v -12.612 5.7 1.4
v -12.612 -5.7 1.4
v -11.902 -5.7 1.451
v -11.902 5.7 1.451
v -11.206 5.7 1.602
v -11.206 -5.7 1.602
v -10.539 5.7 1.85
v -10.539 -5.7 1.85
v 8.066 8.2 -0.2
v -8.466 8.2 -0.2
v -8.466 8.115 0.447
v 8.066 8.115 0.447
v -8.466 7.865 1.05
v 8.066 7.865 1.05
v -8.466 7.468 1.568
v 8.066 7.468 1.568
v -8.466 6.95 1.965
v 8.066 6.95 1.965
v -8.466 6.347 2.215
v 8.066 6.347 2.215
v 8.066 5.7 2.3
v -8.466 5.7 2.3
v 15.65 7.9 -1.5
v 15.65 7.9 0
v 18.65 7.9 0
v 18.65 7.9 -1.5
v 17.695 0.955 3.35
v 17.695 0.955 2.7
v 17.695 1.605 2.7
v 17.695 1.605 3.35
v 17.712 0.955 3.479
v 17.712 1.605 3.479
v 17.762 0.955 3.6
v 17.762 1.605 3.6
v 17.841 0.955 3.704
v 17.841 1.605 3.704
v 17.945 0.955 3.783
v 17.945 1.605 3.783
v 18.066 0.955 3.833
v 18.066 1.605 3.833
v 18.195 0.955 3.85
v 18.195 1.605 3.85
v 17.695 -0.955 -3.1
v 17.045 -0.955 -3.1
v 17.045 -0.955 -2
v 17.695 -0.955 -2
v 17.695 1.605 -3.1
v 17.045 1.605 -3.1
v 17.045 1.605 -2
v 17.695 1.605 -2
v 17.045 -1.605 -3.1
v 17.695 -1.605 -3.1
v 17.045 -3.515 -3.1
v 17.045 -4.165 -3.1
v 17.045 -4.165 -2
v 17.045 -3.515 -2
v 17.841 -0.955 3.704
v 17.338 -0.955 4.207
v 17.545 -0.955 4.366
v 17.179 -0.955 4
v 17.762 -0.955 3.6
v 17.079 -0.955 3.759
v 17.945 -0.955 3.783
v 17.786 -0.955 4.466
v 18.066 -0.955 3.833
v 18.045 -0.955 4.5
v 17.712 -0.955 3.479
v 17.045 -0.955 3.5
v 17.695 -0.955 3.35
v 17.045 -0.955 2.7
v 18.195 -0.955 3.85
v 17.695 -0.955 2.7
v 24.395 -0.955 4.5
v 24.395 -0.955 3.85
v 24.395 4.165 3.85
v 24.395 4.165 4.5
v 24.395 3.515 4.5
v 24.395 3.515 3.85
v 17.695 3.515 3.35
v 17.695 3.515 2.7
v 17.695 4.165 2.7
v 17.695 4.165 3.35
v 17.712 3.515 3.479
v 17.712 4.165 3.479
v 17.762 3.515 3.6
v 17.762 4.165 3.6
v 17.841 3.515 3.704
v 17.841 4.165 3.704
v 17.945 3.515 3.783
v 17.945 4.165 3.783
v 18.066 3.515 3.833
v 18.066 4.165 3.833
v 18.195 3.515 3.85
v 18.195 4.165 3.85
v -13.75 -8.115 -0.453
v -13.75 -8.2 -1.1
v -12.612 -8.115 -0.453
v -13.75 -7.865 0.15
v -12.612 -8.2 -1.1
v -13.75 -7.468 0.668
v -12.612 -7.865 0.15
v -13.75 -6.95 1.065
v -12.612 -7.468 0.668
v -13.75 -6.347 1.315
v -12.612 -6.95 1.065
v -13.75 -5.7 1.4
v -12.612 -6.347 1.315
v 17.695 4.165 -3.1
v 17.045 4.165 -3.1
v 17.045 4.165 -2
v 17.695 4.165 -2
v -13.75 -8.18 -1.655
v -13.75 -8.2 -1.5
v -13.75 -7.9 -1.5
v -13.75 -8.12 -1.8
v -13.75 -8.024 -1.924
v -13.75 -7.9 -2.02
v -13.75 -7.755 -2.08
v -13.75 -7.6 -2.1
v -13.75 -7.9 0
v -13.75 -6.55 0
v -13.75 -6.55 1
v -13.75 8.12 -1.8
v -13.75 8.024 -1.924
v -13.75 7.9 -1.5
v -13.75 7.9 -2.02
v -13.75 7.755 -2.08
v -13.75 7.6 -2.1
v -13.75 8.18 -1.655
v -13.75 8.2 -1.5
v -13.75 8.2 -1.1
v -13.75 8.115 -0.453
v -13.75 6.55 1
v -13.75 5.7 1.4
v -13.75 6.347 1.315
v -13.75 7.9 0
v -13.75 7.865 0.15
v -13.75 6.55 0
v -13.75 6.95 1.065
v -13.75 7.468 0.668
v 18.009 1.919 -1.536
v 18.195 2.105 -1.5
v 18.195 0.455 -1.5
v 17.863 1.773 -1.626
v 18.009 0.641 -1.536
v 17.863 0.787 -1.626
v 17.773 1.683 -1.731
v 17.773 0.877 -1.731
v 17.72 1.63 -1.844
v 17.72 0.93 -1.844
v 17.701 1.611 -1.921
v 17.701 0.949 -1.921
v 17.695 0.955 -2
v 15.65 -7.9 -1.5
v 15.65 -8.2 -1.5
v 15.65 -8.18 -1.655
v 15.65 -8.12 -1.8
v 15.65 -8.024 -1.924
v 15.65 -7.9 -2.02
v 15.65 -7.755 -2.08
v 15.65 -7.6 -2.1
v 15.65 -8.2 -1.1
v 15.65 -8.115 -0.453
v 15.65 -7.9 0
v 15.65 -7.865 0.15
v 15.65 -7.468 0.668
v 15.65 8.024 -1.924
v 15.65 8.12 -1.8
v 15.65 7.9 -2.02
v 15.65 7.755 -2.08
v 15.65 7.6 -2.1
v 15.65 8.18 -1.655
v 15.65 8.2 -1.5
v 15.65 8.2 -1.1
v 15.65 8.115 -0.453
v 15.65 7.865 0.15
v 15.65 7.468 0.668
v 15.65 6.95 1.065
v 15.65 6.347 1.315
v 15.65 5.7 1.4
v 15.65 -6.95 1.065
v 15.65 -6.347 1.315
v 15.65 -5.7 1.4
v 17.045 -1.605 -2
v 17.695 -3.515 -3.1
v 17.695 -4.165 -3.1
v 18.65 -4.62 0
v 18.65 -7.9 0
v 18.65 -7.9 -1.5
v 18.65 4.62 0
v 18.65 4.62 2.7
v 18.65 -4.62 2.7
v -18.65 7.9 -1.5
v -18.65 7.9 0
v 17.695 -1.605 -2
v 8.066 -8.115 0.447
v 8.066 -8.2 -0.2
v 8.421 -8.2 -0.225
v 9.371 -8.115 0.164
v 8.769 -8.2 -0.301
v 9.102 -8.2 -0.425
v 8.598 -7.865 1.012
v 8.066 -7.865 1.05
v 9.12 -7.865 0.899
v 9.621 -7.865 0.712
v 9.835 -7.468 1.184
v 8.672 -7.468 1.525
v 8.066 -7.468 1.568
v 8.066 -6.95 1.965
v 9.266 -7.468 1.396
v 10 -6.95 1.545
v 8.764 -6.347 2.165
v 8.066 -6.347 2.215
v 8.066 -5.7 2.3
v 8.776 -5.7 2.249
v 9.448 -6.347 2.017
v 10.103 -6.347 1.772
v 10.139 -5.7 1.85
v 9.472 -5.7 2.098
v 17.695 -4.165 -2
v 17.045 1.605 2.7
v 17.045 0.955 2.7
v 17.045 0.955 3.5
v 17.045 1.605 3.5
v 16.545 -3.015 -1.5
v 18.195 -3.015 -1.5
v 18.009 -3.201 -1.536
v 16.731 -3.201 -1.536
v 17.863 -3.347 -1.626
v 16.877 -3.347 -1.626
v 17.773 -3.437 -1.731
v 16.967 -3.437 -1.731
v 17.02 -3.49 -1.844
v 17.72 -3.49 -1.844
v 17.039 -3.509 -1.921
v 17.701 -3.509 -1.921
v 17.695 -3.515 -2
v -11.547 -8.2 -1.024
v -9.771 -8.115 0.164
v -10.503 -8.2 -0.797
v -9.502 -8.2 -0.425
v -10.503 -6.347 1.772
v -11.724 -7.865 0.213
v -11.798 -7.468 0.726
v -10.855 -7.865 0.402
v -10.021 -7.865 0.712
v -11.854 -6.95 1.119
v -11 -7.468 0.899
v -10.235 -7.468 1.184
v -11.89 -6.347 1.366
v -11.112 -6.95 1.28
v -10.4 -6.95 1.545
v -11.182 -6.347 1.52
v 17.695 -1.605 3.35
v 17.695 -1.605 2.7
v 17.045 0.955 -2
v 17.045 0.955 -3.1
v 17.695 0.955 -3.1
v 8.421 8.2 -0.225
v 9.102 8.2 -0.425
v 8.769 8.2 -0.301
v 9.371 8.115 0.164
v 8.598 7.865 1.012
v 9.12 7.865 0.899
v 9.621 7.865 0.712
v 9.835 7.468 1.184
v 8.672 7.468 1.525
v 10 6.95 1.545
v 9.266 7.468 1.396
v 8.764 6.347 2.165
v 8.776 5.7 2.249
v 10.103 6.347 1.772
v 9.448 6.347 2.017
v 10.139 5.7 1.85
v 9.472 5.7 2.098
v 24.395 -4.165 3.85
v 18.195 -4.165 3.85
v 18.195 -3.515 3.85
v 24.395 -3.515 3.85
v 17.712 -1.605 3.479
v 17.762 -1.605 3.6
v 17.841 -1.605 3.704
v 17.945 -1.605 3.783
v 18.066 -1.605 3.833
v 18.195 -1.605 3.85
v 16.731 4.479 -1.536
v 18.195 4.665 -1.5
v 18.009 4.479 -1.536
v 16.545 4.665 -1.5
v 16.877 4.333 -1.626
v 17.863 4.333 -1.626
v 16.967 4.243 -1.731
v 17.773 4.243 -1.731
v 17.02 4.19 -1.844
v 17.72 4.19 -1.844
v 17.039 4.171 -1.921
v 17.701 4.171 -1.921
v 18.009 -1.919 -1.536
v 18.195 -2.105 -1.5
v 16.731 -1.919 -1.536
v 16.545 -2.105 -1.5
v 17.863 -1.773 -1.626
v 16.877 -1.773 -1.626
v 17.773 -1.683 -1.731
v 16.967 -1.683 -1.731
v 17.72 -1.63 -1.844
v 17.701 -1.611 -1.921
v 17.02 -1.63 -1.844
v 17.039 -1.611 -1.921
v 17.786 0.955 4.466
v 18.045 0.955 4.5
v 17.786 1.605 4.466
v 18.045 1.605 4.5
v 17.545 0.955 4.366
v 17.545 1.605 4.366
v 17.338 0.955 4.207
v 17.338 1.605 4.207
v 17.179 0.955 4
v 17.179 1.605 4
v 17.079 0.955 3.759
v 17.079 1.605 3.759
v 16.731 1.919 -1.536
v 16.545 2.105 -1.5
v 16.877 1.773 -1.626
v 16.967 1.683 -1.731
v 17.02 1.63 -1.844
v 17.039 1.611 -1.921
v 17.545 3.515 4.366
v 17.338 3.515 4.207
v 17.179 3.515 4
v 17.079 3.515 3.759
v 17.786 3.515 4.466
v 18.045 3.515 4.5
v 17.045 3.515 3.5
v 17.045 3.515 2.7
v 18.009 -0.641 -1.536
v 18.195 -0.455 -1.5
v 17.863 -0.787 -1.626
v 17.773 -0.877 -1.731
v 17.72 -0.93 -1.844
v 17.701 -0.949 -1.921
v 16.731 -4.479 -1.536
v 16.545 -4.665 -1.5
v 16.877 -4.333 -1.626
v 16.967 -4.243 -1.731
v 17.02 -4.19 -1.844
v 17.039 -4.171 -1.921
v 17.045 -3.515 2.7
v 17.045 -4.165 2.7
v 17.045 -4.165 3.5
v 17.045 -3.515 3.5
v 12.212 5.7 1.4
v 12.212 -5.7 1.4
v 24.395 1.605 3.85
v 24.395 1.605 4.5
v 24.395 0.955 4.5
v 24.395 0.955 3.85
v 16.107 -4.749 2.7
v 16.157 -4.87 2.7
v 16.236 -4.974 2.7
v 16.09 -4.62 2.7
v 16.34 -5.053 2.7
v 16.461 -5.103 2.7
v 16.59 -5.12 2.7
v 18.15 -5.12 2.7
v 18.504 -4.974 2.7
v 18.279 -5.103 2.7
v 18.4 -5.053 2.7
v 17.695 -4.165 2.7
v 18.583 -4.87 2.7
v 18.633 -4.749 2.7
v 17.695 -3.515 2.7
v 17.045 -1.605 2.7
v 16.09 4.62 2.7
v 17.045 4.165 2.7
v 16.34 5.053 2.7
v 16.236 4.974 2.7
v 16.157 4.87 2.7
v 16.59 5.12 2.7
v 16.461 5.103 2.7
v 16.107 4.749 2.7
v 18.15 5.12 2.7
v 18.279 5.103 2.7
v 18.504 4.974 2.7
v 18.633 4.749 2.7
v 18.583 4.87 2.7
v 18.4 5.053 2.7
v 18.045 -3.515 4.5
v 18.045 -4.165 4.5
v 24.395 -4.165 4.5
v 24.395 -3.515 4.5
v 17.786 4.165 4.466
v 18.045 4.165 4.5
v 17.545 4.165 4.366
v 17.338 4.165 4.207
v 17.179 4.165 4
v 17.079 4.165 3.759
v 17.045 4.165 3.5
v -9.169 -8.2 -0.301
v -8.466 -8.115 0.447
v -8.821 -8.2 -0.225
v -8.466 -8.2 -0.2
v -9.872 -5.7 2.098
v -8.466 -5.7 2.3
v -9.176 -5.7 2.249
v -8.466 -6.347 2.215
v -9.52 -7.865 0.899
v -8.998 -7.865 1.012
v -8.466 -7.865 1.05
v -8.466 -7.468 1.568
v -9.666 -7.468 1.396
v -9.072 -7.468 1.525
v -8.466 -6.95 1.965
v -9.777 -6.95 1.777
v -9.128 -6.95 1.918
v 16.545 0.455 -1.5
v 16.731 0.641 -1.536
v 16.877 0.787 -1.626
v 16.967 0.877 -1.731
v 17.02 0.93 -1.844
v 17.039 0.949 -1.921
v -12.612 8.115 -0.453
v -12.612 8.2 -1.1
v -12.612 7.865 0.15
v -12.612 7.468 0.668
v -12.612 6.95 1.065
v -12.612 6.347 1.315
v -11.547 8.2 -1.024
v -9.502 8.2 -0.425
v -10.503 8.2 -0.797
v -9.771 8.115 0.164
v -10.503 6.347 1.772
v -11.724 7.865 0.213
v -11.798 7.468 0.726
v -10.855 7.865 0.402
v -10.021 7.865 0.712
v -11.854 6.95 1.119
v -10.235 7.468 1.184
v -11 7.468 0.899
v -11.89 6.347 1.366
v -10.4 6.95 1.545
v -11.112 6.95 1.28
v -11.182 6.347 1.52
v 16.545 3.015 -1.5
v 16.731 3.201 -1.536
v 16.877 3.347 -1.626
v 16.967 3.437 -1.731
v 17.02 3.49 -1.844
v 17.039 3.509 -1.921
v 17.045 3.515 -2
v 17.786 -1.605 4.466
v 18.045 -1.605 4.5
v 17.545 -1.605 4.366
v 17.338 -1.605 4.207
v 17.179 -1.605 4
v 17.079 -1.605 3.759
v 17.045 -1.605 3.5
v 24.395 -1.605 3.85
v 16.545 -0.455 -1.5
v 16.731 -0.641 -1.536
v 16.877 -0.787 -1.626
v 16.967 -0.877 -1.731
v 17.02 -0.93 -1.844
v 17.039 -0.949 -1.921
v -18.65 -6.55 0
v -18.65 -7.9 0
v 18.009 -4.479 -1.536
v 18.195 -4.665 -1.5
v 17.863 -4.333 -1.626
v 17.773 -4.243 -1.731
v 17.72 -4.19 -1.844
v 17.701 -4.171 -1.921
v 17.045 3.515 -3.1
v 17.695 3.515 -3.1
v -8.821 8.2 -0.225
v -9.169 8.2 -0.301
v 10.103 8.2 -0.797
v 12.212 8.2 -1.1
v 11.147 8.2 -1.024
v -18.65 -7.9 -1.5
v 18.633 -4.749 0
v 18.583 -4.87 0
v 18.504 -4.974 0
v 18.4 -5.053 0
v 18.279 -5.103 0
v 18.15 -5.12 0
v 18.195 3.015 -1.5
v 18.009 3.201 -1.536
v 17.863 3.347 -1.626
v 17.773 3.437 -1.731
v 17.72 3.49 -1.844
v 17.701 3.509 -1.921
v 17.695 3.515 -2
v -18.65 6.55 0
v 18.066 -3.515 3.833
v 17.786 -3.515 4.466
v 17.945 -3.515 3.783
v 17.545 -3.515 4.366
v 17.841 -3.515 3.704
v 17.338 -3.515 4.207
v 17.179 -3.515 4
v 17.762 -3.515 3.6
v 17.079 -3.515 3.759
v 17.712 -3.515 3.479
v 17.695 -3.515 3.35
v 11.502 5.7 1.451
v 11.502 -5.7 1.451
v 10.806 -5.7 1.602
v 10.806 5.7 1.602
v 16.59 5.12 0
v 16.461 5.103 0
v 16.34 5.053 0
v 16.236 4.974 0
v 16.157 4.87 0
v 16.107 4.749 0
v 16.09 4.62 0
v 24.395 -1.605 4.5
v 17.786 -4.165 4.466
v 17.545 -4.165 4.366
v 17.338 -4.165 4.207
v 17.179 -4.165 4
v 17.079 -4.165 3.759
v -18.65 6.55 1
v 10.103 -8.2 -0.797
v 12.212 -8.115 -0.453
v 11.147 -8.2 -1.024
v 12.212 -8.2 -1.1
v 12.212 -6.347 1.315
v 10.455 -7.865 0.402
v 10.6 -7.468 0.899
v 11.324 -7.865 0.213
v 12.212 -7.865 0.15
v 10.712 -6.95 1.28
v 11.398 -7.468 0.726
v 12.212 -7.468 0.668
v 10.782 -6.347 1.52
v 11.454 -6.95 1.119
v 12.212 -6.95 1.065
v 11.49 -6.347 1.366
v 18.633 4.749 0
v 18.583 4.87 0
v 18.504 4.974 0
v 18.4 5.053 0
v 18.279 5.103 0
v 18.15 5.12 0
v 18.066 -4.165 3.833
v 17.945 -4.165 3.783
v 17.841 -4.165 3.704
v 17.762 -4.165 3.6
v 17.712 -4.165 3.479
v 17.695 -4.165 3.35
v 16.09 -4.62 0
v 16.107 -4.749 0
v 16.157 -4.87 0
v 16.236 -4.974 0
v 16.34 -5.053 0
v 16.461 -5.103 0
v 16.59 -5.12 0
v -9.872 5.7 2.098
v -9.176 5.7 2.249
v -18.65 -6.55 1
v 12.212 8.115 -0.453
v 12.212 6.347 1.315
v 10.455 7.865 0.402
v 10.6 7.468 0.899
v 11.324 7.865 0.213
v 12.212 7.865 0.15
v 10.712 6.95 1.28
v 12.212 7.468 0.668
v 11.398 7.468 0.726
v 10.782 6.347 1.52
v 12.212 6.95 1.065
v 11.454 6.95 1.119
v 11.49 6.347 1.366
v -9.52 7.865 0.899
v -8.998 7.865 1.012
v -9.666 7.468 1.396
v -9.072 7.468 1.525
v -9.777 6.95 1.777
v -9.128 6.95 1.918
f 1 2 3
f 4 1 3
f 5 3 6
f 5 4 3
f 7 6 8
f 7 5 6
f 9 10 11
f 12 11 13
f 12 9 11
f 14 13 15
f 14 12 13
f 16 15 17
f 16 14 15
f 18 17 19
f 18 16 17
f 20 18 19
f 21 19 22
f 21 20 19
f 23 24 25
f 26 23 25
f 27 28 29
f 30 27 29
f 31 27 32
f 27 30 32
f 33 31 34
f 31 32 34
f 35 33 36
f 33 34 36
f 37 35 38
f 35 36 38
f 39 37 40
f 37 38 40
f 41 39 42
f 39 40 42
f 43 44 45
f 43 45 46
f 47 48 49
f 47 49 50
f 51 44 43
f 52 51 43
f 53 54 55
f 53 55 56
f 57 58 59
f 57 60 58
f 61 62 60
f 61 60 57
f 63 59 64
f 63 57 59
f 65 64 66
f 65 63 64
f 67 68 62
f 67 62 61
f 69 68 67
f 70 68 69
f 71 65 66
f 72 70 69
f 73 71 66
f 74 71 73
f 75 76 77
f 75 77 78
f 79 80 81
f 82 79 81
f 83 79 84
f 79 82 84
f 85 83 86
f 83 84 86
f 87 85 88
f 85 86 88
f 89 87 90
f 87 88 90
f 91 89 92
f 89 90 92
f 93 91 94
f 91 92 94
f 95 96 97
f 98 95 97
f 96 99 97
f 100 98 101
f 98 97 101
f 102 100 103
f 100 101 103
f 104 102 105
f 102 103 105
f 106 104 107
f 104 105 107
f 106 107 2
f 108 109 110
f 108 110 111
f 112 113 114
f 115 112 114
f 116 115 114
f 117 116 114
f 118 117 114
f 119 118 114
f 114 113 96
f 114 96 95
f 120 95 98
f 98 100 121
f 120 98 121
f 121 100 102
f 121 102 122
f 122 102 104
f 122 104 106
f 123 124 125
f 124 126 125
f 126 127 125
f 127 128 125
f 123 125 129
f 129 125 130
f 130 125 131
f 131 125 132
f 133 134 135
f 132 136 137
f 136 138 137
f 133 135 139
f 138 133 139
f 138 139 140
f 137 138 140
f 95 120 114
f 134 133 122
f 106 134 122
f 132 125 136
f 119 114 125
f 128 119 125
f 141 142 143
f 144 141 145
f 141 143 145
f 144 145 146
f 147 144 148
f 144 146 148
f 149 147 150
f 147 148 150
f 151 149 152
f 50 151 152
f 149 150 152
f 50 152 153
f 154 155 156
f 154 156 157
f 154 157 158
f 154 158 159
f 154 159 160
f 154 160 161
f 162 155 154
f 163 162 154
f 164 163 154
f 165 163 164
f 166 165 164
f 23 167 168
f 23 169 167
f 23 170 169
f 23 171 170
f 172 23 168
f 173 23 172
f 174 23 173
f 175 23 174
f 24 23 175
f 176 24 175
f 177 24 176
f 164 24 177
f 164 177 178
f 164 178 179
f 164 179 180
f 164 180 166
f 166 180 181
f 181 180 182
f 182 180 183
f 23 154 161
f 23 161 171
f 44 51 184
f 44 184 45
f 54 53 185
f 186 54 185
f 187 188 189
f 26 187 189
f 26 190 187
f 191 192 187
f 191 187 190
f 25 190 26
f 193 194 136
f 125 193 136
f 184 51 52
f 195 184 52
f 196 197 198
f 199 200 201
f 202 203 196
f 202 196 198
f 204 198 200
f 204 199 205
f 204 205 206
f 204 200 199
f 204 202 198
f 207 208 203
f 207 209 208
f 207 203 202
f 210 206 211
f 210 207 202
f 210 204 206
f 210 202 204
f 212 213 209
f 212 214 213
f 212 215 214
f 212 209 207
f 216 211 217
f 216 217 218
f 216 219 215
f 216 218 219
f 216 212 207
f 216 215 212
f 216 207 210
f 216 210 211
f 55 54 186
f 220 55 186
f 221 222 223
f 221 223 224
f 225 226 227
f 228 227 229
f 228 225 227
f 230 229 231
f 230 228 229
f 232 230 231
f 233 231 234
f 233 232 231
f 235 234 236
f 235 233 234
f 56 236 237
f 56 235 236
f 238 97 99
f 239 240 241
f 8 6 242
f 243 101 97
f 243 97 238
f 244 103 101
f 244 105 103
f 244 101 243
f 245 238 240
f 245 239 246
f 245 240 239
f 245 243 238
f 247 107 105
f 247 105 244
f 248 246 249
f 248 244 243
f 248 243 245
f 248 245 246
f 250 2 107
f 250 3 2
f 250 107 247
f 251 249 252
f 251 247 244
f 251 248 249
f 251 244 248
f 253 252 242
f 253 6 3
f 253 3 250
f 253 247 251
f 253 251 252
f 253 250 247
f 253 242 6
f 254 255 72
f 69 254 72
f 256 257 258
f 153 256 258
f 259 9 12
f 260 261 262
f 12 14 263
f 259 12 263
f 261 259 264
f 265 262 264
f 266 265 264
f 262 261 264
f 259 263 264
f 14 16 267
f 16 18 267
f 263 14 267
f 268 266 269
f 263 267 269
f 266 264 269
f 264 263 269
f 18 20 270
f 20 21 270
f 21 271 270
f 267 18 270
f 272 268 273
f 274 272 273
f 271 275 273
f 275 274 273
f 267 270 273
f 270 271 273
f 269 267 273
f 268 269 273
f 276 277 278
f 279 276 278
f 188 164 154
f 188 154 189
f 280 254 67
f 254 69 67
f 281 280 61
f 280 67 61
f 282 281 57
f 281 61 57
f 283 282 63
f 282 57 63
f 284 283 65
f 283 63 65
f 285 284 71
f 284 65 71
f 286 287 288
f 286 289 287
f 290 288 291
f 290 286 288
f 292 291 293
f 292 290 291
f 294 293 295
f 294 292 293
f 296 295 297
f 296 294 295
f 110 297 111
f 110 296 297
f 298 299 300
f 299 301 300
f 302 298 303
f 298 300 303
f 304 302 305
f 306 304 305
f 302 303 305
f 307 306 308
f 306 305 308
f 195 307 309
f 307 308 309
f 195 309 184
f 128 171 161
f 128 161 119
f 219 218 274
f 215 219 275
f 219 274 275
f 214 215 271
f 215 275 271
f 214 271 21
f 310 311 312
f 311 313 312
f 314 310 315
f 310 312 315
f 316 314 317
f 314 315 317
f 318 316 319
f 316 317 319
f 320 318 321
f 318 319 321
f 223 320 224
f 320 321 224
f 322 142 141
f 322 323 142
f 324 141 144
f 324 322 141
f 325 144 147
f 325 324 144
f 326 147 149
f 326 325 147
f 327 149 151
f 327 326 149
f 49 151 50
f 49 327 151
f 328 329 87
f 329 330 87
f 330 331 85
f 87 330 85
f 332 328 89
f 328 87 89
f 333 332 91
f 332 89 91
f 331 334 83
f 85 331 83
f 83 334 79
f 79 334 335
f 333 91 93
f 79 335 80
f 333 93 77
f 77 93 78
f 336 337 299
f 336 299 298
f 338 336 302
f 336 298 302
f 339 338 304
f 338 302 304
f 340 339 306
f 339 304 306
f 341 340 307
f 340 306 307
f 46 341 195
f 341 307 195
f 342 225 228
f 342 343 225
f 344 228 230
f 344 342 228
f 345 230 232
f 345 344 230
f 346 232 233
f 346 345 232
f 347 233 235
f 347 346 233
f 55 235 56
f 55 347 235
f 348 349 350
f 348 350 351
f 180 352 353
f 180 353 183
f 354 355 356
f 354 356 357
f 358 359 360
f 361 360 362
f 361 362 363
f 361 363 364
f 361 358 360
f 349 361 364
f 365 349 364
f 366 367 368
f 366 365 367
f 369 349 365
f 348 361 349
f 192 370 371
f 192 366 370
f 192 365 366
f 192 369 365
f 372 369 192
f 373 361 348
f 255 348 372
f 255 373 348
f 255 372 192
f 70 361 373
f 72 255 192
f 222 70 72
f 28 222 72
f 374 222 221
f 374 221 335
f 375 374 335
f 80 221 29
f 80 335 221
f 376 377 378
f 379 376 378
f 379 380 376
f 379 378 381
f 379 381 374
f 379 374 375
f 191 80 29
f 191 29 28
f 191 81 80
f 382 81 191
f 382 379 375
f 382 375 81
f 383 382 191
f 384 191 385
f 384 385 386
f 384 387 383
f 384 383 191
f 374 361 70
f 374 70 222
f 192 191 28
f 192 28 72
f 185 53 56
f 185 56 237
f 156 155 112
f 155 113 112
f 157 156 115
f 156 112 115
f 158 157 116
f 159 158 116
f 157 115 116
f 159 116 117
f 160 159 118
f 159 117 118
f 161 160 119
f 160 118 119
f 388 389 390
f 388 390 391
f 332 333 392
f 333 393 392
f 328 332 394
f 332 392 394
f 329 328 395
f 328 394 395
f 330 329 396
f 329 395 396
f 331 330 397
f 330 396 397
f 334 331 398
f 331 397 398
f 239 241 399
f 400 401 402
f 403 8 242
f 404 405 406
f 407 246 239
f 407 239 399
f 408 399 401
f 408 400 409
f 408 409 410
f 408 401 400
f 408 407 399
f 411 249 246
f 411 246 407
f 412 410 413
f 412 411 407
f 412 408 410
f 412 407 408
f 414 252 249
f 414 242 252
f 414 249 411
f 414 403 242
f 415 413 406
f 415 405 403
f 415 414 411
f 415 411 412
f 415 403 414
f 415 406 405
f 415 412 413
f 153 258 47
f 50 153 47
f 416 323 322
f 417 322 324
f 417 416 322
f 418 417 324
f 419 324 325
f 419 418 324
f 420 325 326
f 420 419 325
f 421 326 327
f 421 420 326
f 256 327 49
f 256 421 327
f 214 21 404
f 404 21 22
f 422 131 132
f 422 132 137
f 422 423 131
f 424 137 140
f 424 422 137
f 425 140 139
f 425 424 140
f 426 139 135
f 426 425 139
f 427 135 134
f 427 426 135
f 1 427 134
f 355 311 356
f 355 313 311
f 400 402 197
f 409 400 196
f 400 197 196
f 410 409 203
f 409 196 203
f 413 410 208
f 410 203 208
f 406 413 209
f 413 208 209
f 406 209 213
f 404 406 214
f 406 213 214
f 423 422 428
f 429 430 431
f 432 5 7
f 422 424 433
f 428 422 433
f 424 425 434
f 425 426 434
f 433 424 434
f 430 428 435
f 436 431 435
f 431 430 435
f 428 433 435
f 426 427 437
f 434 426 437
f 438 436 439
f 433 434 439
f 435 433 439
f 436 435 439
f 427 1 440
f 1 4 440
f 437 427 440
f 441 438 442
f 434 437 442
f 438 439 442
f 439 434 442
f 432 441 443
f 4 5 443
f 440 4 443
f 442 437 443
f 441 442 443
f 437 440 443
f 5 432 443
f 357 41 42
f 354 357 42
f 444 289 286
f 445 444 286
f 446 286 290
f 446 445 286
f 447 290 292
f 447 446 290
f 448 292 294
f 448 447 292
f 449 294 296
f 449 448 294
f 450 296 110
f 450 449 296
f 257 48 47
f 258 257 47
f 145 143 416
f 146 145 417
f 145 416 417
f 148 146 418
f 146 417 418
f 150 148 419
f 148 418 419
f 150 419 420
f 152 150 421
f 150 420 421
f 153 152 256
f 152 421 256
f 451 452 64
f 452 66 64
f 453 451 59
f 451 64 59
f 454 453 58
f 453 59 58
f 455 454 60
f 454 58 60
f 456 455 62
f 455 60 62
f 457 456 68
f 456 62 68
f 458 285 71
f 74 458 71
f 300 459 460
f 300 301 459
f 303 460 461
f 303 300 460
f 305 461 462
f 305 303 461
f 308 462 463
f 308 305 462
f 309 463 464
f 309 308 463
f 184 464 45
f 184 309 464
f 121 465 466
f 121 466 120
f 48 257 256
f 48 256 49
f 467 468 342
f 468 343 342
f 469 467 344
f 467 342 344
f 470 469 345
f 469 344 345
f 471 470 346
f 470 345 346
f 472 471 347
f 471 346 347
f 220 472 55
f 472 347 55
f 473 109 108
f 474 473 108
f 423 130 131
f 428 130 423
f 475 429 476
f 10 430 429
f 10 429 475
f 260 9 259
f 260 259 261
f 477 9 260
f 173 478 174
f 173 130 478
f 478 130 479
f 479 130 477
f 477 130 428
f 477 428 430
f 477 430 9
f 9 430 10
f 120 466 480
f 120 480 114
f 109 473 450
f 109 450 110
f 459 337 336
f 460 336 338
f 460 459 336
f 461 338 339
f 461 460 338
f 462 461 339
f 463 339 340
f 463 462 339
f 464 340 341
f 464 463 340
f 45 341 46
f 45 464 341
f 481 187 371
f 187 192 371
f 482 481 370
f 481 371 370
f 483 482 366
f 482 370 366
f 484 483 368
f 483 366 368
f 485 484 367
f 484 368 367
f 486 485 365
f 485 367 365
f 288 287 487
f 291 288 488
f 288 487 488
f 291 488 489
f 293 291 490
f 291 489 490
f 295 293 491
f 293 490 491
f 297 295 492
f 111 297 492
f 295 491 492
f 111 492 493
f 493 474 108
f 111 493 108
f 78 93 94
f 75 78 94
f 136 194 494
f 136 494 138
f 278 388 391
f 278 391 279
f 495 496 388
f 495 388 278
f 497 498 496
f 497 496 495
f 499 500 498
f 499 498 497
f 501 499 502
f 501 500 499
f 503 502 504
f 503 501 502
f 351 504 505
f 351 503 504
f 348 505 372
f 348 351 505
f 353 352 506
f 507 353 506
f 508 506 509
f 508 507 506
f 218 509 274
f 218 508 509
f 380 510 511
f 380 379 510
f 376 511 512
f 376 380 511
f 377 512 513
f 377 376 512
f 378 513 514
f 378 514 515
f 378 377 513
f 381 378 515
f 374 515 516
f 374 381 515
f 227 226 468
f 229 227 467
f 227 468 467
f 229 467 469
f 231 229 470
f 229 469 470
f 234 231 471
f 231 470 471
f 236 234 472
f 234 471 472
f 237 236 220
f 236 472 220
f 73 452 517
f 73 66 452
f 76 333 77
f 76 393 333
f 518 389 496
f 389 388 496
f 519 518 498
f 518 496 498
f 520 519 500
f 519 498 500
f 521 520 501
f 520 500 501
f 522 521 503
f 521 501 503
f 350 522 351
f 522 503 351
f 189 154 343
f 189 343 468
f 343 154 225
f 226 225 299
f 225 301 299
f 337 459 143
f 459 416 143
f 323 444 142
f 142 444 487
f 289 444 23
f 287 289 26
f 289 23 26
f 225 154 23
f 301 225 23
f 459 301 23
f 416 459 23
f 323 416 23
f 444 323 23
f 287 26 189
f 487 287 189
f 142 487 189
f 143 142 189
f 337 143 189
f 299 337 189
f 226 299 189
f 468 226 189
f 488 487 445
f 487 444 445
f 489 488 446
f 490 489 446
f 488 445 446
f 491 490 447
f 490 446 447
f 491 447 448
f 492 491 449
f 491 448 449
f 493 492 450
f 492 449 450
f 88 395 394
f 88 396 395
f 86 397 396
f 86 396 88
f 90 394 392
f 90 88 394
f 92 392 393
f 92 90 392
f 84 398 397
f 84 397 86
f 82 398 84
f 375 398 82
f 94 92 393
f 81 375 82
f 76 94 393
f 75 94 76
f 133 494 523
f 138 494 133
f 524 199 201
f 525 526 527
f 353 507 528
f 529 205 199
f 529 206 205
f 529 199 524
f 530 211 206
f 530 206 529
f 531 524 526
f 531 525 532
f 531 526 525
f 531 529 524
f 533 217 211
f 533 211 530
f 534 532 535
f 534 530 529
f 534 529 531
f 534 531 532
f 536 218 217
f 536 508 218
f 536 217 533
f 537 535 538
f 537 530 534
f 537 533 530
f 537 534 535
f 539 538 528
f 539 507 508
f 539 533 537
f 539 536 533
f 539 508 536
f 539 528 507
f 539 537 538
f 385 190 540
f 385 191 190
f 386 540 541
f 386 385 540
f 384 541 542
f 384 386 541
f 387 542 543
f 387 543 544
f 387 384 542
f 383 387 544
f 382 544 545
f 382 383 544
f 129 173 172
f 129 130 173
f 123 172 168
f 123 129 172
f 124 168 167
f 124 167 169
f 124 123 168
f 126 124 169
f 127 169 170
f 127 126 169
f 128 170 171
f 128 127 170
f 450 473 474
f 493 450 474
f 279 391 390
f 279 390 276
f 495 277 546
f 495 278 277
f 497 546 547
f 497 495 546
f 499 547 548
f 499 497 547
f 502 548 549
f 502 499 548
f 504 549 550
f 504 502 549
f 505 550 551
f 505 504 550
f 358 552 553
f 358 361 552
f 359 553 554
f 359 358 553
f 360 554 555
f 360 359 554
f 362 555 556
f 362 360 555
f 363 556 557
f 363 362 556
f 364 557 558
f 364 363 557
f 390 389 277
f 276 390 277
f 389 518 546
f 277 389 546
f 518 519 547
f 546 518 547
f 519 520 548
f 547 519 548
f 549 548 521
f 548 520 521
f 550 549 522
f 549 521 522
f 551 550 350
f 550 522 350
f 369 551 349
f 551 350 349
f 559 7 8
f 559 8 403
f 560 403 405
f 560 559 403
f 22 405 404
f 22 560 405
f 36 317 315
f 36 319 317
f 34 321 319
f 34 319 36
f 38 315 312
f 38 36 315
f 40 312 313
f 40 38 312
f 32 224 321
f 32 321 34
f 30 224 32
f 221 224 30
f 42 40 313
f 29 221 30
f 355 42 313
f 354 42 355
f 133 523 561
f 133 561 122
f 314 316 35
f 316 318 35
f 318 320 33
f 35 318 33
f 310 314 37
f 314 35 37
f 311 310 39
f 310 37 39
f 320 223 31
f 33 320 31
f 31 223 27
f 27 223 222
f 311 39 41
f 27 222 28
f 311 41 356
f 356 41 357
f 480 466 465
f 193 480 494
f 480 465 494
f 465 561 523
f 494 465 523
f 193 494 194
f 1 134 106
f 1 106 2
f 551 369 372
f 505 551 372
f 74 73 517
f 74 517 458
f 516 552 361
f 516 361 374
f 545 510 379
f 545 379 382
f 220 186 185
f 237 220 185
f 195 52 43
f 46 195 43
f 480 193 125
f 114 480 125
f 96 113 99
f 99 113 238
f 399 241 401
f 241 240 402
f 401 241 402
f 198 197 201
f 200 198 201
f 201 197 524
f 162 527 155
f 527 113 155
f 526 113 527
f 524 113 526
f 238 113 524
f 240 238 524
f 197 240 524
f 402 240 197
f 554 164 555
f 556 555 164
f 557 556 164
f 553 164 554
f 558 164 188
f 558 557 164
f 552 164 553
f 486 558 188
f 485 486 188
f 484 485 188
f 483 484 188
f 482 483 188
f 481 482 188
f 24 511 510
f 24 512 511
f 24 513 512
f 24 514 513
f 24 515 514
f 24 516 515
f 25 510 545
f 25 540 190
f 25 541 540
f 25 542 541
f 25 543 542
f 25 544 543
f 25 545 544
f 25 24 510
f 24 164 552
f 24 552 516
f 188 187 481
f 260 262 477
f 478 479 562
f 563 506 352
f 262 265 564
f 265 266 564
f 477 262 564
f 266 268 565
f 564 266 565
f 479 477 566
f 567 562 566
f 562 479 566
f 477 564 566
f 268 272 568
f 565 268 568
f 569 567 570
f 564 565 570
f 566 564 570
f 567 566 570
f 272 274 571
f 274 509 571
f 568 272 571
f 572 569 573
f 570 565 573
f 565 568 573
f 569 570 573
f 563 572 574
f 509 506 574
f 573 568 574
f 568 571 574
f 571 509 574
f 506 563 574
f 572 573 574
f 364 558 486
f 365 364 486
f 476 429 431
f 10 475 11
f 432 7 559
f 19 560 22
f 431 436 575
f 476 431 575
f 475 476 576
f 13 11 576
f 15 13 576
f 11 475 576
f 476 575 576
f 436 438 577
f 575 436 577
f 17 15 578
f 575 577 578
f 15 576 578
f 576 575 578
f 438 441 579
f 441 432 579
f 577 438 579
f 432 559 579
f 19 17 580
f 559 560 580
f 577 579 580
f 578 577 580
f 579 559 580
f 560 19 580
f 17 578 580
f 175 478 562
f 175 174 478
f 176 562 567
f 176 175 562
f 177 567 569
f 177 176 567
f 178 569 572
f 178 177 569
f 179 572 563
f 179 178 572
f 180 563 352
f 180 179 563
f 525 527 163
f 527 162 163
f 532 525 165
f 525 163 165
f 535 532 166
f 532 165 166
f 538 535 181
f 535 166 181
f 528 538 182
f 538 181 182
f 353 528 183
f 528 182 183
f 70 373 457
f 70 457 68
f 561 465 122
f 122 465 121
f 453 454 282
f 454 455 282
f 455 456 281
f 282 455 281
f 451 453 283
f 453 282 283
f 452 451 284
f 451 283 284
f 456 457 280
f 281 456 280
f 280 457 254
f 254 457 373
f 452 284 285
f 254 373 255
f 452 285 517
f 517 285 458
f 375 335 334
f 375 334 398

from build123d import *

# Parameters (mm, degrees)
SKICA1_W                     = 37.3
SKICA1_H                     = 15.8
P_IDAT_VYSUNUT_M1_DEPTH      = 1.5
SKICA1_3_W                   = 27.2
SKICA1_3_H                   = 13.1
P_IDAT_VYSUNUT_M2_DEPTH      = 1
SKICA2_W                     = 2.56
SKICA2_H                     = 10.24
P_IDAT_VYSUNUT_M3_DEPTH      = 2.7
P_IDAT_VYSUNUT_M4_DEPTH      = 1.8
P_IDAT_VYSUNUT_M4_DEPTH_BACK = 5.8
SKICA3_W                     = 0.65
SKICA3_H                     = 0.65
SKICA4_W                     = 0.65
SKICA4_H                     = 0.65
P_IDAT_VYSUNUT_M5_DEPTH      = 6.7
ZAOBLIT1_R                   = 1
ZAOBLIT2_R                   = 0.5
P_IDAT_VYSUNUT_M6_DEPTH      = 0.6
P_IDAT_VYSUNUT_M6_DEPTH_BACK = 3.8
SKICA5_W                     = 29.4
SKICA5_H                     = 16.4
SKICA6_W                     = 6.3
SKICA6_H                     = 16.4
ODEBRAT_VYSUNUT_M1_DEPTH     = 0.9
ZAOBLIT3_R                   = 5
ZAOBLIT4_R                   = 5
SKICA7_W                     = 4
SKICA7_H                     = 16.4
ODEBRAT_VYSUNUT_M2_DEPTH     = 0.9
ZAOBLIT7_R                   = 5
ZAOBLIT8_R                   = 5
ZAOBLIT5_R                   = 2.5
ZAOBLIT6_R                   = 0.6
ZAOBLIT9_R                   = 0.5
ZAOBLIT10_R                  = 0.5


with BuildPart() as part:
    # Skica1 → Přidat vysunutím1 (new body)
    with BuildSketch(Plane.XY):
        Rectangle(SKICA1_W, SKICA1_H)
    extrude(amount=-P_IDAT_VYSUNUT_M1_DEPTH)

    # Skica1<3> → Přidat vysunutím2 (add)
    with BuildSketch(Plane.XY):
        with Locations((-5.05, 0)):
            Rectangle(SKICA1_3_W, SKICA1_3_H)
    extrude(amount=P_IDAT_VYSUNUT_M2_DEPTH)

    # Skica2 → Přidat vysunutím3 (add)
    with BuildSketch(Plane.XY):
        with Locations((17.37, 0)):
            Rectangle(SKICA2_W, SKICA2_H)
    extrude(amount=P_IDAT_VYSUNUT_M3_DEPTH)

    # Skica3 → Přidat vysunutím4 (add, two sides: drawn at the far end of the back side and taken through both)
    with BuildSketch(Plane.XY.offset(2.7).offset(-P_IDAT_VYSUNUT_M4_DEPTH_BACK)):
        with Locations((17.37, -3.84)):
            Rectangle(SKICA3_W, SKICA3_H)
        with Locations((17.37, -1.28)):
            Rectangle(SKICA3_W, SKICA3_H)
        with Locations((17.37, 1.28)):
            Rectangle(SKICA3_W, SKICA3_H)
        with Locations((17.37, 3.84)):
            Rectangle(SKICA3_W, SKICA3_H)
    extrude(amount=P_IDAT_VYSUNUT_M4_DEPTH + P_IDAT_VYSUNUT_M4_DEPTH_BACK)

    # Skica4 → Přidat vysunutím5 (add)
    with BuildSketch(Plane(origin=(17.695, 0, 0), x_dir=(0, 0, -1), z_dir=(1, 0, 0))):
        with Locations((-4.175, -3.84)):
            Rectangle(SKICA4_W, SKICA4_H)
        with Locations((-4.175, -1.28)):
            Rectangle(SKICA4_W, SKICA4_H)
        with Locations((-4.175, 1.28)):
            Rectangle(SKICA4_W, SKICA4_H)
        with Locations((-4.175, 3.84)):
            Rectangle(SKICA4_W, SKICA4_H)
    extrude(amount=P_IDAT_VYSUNUT_M5_DEPTH)

    # Zaoblit1
    zaoblit1_edges = [part.edges().sort_by_distance(p)[0] for p in [
        (17.045, 3.84, 4.5),
        (17.045, -3.84, 4.5),
        (17.045, -1.28, 4.5),
        (17.045, 1.28, 4.5),
    ]]
    fillet(zaoblit1_edges, radius=ZAOBLIT1_R)

    # Zaoblit2
    zaoblit2_edges = [part.edges().sort_by_distance(p)[0] for p in [
        (17.695, -3.84, 3.85),
        (17.695, -1.28, 3.85),
        (17.695, 1.28, 3.85),
        (17.695, 3.84, 3.85),
    ]]
    fillet(zaoblit2_edges, radius=ZAOBLIT2_R)

    # Skica5 → Přidat vysunutím6 (add, two sides: drawn at the far end of the back side and taken through both)
    with BuildSketch(Plane(origin=(0, 0, -1.5), x_dir=(-1, 0, 0), z_dir=(0, 0, -1)).offset(-P_IDAT_VYSUNUT_M6_DEPTH_BACK)):
        with Locations((-0.95, 0)):
            Rectangle(SKICA5_W, SKICA5_H)
    extrude(amount=P_IDAT_VYSUNUT_M6_DEPTH + P_IDAT_VYSUNUT_M6_DEPTH_BACK)

    # Skica6 → Odebrat vysunutím1 (cut)
    with BuildSketch(Plane.XY.offset(2.3)):
        with Locations((12.5, 0)):
            Rectangle(SKICA6_W, SKICA6_H)
    extrude(amount=-ODEBRAT_VYSUNUT_M1_DEPTH, mode=Mode.SUBTRACT)

    # Zaoblit3
    # the kernel refuses this fillet: 5 mm, written as the material it adds along each edge
    with BuildSketch(Plane(origin=(9.35, -8.2, 1.4), x_dir=(1, 0, 0), z_dir=(0, 1, 0))) as zaoblit3_piece_1:
        with BuildLine():
            CenterArc((2.861817604, -5), ZAOBLIT3_R, 90, 34.915206247)
            Line((0, -0.9), (-0.057236352, -0.818))
            ThreePointArc((-0.057236352, -0.818), (-0.1, -0.45), (-0.1, 0))
            Line((-0.1, 0), (0, 0.1))
            Line((0, 0.1), (2.861817604, 0.1))
            Line((2.861817604, 0.1), (2.861817604, 0))
        make_face()
    extrude(amount=16.4)

    # Zaoblit4
    zaoblit4_edges = [part.edges().sort_by_distance(p)[0] for p in [
        (9.35, 0, 2.3),
    ]]
    fillet(zaoblit4_edges, radius=ZAOBLIT4_R)

    # Skica7 → Odebrat vysunutím2 (cut)
    with BuildSketch(Plane.XY.offset(2.3)):
        with Locations((-11.75, 0)):
            Rectangle(SKICA7_W, SKICA7_H)
    extrude(amount=-ODEBRAT_VYSUNUT_M2_DEPTH, mode=Mode.SUBTRACT)

    # Zaoblit7
    # the kernel refuses this fillet: 5 mm, written as the material it adds along each edge
    with BuildSketch(Plane(origin=(-9.75, 8.2, 1.4), x_dir=(-1, 0, 0), z_dir=(0, -1, 0))) as zaoblit7_piece_1:
        with BuildLine():
            CenterArc((2.861817604, -5), ZAOBLIT7_R, 90, 34.915206247)
            Line((0, -0.9), (0, 0))
            Line((0, 0), (2.861817604, 0))
        make_face()
    extrude(amount=16.4)

    # Zaoblit8
    zaoblit8_edges = [part.edges().sort_by_distance(p)[0] for p in [
        (-9.75, 0, 2.3),
    ]]
    fillet(zaoblit8_edges, radius=ZAOBLIT8_R)

    # Zaoblit5
    zaoblit5_edges = [part.edges().sort_by_distance(p)[0] for p in [
        (13.930908802, 8.2, 1.4),
        (13.930908802, -8.2, 1.4),
        (11.151157432, -8.2, 1.513794929),
        (11.151157432, 8.2, 1.513794929),
        (-0.2, -8.2, 2.3),
        (9.126395288, -8.2, 2.186205071),
        (9.126395288, 8.2, 2.186205071),
        (-13.180908802, -8.2, 1.4),
        (-13.180908802, 8.2, 1.4),
        (-11.551157432, 8.2, 1.513794929),
        (-11.551157432, -8.2, 1.513794929),
        (-0.2, 8.2, 2.3),
        (-9.526395288, 8.2, 2.186205071),
        (-9.526395288, -8.2, 2.186205071),
    ]]
    fillet(zaoblit5_edges, radius=ZAOBLIT5_R)

    # Zaoblit6
    zaoblit6_edges = [part.edges().sort_by_distance(p)[0] for p in [
        (0.95, 8.2, -2.1),
        (0.95, -8.2, -2.1),
    ]]
    fillet(zaoblit6_edges, radius=ZAOBLIT6_R)

    # Zaoblit9
    zaoblit9_edges = [part.edges().sort_by_distance(p)[0] for p in [
        (18.65, -5.12, 1.35),
        (18.65, 5.12, 1.35),
        (16.09, 5.12, 1.35),
        (16.09, -5.12, 1.35),
    ]]
    fillet(zaoblit9_edges, radius=ZAOBLIT9_R)

    # Zaoblit10
    zaoblit10_edges = [part.edges().sort_by_distance(p)[0] for p in [
        (17.695, 3.84, -1.5),
        (17.37, 3.515, -1.5),
        (17.045, 3.84, -1.5),
        (17.37, 4.165, -1.5),
        (17.045, -3.84, -1.5),
        (17.37, -3.515, -1.5),
        (17.695, -3.84, -1.5),
        (17.37, -4.165, -1.5),
        (17.045, -1.28, -1.5),
        (17.37, -0.955, -1.5),
        (17.695, -1.28, -1.5),
        (17.37, -1.605, -1.5),
        (17.695, 1.28, -1.5),
        (17.37, 0.955, -1.5),
        (17.045, 1.28, -1.5),
        (17.37, 1.605, -1.5),
    ]]
    fillet(zaoblit10_edges, radius=ZAOBLIT10_R)


solid = part.part
